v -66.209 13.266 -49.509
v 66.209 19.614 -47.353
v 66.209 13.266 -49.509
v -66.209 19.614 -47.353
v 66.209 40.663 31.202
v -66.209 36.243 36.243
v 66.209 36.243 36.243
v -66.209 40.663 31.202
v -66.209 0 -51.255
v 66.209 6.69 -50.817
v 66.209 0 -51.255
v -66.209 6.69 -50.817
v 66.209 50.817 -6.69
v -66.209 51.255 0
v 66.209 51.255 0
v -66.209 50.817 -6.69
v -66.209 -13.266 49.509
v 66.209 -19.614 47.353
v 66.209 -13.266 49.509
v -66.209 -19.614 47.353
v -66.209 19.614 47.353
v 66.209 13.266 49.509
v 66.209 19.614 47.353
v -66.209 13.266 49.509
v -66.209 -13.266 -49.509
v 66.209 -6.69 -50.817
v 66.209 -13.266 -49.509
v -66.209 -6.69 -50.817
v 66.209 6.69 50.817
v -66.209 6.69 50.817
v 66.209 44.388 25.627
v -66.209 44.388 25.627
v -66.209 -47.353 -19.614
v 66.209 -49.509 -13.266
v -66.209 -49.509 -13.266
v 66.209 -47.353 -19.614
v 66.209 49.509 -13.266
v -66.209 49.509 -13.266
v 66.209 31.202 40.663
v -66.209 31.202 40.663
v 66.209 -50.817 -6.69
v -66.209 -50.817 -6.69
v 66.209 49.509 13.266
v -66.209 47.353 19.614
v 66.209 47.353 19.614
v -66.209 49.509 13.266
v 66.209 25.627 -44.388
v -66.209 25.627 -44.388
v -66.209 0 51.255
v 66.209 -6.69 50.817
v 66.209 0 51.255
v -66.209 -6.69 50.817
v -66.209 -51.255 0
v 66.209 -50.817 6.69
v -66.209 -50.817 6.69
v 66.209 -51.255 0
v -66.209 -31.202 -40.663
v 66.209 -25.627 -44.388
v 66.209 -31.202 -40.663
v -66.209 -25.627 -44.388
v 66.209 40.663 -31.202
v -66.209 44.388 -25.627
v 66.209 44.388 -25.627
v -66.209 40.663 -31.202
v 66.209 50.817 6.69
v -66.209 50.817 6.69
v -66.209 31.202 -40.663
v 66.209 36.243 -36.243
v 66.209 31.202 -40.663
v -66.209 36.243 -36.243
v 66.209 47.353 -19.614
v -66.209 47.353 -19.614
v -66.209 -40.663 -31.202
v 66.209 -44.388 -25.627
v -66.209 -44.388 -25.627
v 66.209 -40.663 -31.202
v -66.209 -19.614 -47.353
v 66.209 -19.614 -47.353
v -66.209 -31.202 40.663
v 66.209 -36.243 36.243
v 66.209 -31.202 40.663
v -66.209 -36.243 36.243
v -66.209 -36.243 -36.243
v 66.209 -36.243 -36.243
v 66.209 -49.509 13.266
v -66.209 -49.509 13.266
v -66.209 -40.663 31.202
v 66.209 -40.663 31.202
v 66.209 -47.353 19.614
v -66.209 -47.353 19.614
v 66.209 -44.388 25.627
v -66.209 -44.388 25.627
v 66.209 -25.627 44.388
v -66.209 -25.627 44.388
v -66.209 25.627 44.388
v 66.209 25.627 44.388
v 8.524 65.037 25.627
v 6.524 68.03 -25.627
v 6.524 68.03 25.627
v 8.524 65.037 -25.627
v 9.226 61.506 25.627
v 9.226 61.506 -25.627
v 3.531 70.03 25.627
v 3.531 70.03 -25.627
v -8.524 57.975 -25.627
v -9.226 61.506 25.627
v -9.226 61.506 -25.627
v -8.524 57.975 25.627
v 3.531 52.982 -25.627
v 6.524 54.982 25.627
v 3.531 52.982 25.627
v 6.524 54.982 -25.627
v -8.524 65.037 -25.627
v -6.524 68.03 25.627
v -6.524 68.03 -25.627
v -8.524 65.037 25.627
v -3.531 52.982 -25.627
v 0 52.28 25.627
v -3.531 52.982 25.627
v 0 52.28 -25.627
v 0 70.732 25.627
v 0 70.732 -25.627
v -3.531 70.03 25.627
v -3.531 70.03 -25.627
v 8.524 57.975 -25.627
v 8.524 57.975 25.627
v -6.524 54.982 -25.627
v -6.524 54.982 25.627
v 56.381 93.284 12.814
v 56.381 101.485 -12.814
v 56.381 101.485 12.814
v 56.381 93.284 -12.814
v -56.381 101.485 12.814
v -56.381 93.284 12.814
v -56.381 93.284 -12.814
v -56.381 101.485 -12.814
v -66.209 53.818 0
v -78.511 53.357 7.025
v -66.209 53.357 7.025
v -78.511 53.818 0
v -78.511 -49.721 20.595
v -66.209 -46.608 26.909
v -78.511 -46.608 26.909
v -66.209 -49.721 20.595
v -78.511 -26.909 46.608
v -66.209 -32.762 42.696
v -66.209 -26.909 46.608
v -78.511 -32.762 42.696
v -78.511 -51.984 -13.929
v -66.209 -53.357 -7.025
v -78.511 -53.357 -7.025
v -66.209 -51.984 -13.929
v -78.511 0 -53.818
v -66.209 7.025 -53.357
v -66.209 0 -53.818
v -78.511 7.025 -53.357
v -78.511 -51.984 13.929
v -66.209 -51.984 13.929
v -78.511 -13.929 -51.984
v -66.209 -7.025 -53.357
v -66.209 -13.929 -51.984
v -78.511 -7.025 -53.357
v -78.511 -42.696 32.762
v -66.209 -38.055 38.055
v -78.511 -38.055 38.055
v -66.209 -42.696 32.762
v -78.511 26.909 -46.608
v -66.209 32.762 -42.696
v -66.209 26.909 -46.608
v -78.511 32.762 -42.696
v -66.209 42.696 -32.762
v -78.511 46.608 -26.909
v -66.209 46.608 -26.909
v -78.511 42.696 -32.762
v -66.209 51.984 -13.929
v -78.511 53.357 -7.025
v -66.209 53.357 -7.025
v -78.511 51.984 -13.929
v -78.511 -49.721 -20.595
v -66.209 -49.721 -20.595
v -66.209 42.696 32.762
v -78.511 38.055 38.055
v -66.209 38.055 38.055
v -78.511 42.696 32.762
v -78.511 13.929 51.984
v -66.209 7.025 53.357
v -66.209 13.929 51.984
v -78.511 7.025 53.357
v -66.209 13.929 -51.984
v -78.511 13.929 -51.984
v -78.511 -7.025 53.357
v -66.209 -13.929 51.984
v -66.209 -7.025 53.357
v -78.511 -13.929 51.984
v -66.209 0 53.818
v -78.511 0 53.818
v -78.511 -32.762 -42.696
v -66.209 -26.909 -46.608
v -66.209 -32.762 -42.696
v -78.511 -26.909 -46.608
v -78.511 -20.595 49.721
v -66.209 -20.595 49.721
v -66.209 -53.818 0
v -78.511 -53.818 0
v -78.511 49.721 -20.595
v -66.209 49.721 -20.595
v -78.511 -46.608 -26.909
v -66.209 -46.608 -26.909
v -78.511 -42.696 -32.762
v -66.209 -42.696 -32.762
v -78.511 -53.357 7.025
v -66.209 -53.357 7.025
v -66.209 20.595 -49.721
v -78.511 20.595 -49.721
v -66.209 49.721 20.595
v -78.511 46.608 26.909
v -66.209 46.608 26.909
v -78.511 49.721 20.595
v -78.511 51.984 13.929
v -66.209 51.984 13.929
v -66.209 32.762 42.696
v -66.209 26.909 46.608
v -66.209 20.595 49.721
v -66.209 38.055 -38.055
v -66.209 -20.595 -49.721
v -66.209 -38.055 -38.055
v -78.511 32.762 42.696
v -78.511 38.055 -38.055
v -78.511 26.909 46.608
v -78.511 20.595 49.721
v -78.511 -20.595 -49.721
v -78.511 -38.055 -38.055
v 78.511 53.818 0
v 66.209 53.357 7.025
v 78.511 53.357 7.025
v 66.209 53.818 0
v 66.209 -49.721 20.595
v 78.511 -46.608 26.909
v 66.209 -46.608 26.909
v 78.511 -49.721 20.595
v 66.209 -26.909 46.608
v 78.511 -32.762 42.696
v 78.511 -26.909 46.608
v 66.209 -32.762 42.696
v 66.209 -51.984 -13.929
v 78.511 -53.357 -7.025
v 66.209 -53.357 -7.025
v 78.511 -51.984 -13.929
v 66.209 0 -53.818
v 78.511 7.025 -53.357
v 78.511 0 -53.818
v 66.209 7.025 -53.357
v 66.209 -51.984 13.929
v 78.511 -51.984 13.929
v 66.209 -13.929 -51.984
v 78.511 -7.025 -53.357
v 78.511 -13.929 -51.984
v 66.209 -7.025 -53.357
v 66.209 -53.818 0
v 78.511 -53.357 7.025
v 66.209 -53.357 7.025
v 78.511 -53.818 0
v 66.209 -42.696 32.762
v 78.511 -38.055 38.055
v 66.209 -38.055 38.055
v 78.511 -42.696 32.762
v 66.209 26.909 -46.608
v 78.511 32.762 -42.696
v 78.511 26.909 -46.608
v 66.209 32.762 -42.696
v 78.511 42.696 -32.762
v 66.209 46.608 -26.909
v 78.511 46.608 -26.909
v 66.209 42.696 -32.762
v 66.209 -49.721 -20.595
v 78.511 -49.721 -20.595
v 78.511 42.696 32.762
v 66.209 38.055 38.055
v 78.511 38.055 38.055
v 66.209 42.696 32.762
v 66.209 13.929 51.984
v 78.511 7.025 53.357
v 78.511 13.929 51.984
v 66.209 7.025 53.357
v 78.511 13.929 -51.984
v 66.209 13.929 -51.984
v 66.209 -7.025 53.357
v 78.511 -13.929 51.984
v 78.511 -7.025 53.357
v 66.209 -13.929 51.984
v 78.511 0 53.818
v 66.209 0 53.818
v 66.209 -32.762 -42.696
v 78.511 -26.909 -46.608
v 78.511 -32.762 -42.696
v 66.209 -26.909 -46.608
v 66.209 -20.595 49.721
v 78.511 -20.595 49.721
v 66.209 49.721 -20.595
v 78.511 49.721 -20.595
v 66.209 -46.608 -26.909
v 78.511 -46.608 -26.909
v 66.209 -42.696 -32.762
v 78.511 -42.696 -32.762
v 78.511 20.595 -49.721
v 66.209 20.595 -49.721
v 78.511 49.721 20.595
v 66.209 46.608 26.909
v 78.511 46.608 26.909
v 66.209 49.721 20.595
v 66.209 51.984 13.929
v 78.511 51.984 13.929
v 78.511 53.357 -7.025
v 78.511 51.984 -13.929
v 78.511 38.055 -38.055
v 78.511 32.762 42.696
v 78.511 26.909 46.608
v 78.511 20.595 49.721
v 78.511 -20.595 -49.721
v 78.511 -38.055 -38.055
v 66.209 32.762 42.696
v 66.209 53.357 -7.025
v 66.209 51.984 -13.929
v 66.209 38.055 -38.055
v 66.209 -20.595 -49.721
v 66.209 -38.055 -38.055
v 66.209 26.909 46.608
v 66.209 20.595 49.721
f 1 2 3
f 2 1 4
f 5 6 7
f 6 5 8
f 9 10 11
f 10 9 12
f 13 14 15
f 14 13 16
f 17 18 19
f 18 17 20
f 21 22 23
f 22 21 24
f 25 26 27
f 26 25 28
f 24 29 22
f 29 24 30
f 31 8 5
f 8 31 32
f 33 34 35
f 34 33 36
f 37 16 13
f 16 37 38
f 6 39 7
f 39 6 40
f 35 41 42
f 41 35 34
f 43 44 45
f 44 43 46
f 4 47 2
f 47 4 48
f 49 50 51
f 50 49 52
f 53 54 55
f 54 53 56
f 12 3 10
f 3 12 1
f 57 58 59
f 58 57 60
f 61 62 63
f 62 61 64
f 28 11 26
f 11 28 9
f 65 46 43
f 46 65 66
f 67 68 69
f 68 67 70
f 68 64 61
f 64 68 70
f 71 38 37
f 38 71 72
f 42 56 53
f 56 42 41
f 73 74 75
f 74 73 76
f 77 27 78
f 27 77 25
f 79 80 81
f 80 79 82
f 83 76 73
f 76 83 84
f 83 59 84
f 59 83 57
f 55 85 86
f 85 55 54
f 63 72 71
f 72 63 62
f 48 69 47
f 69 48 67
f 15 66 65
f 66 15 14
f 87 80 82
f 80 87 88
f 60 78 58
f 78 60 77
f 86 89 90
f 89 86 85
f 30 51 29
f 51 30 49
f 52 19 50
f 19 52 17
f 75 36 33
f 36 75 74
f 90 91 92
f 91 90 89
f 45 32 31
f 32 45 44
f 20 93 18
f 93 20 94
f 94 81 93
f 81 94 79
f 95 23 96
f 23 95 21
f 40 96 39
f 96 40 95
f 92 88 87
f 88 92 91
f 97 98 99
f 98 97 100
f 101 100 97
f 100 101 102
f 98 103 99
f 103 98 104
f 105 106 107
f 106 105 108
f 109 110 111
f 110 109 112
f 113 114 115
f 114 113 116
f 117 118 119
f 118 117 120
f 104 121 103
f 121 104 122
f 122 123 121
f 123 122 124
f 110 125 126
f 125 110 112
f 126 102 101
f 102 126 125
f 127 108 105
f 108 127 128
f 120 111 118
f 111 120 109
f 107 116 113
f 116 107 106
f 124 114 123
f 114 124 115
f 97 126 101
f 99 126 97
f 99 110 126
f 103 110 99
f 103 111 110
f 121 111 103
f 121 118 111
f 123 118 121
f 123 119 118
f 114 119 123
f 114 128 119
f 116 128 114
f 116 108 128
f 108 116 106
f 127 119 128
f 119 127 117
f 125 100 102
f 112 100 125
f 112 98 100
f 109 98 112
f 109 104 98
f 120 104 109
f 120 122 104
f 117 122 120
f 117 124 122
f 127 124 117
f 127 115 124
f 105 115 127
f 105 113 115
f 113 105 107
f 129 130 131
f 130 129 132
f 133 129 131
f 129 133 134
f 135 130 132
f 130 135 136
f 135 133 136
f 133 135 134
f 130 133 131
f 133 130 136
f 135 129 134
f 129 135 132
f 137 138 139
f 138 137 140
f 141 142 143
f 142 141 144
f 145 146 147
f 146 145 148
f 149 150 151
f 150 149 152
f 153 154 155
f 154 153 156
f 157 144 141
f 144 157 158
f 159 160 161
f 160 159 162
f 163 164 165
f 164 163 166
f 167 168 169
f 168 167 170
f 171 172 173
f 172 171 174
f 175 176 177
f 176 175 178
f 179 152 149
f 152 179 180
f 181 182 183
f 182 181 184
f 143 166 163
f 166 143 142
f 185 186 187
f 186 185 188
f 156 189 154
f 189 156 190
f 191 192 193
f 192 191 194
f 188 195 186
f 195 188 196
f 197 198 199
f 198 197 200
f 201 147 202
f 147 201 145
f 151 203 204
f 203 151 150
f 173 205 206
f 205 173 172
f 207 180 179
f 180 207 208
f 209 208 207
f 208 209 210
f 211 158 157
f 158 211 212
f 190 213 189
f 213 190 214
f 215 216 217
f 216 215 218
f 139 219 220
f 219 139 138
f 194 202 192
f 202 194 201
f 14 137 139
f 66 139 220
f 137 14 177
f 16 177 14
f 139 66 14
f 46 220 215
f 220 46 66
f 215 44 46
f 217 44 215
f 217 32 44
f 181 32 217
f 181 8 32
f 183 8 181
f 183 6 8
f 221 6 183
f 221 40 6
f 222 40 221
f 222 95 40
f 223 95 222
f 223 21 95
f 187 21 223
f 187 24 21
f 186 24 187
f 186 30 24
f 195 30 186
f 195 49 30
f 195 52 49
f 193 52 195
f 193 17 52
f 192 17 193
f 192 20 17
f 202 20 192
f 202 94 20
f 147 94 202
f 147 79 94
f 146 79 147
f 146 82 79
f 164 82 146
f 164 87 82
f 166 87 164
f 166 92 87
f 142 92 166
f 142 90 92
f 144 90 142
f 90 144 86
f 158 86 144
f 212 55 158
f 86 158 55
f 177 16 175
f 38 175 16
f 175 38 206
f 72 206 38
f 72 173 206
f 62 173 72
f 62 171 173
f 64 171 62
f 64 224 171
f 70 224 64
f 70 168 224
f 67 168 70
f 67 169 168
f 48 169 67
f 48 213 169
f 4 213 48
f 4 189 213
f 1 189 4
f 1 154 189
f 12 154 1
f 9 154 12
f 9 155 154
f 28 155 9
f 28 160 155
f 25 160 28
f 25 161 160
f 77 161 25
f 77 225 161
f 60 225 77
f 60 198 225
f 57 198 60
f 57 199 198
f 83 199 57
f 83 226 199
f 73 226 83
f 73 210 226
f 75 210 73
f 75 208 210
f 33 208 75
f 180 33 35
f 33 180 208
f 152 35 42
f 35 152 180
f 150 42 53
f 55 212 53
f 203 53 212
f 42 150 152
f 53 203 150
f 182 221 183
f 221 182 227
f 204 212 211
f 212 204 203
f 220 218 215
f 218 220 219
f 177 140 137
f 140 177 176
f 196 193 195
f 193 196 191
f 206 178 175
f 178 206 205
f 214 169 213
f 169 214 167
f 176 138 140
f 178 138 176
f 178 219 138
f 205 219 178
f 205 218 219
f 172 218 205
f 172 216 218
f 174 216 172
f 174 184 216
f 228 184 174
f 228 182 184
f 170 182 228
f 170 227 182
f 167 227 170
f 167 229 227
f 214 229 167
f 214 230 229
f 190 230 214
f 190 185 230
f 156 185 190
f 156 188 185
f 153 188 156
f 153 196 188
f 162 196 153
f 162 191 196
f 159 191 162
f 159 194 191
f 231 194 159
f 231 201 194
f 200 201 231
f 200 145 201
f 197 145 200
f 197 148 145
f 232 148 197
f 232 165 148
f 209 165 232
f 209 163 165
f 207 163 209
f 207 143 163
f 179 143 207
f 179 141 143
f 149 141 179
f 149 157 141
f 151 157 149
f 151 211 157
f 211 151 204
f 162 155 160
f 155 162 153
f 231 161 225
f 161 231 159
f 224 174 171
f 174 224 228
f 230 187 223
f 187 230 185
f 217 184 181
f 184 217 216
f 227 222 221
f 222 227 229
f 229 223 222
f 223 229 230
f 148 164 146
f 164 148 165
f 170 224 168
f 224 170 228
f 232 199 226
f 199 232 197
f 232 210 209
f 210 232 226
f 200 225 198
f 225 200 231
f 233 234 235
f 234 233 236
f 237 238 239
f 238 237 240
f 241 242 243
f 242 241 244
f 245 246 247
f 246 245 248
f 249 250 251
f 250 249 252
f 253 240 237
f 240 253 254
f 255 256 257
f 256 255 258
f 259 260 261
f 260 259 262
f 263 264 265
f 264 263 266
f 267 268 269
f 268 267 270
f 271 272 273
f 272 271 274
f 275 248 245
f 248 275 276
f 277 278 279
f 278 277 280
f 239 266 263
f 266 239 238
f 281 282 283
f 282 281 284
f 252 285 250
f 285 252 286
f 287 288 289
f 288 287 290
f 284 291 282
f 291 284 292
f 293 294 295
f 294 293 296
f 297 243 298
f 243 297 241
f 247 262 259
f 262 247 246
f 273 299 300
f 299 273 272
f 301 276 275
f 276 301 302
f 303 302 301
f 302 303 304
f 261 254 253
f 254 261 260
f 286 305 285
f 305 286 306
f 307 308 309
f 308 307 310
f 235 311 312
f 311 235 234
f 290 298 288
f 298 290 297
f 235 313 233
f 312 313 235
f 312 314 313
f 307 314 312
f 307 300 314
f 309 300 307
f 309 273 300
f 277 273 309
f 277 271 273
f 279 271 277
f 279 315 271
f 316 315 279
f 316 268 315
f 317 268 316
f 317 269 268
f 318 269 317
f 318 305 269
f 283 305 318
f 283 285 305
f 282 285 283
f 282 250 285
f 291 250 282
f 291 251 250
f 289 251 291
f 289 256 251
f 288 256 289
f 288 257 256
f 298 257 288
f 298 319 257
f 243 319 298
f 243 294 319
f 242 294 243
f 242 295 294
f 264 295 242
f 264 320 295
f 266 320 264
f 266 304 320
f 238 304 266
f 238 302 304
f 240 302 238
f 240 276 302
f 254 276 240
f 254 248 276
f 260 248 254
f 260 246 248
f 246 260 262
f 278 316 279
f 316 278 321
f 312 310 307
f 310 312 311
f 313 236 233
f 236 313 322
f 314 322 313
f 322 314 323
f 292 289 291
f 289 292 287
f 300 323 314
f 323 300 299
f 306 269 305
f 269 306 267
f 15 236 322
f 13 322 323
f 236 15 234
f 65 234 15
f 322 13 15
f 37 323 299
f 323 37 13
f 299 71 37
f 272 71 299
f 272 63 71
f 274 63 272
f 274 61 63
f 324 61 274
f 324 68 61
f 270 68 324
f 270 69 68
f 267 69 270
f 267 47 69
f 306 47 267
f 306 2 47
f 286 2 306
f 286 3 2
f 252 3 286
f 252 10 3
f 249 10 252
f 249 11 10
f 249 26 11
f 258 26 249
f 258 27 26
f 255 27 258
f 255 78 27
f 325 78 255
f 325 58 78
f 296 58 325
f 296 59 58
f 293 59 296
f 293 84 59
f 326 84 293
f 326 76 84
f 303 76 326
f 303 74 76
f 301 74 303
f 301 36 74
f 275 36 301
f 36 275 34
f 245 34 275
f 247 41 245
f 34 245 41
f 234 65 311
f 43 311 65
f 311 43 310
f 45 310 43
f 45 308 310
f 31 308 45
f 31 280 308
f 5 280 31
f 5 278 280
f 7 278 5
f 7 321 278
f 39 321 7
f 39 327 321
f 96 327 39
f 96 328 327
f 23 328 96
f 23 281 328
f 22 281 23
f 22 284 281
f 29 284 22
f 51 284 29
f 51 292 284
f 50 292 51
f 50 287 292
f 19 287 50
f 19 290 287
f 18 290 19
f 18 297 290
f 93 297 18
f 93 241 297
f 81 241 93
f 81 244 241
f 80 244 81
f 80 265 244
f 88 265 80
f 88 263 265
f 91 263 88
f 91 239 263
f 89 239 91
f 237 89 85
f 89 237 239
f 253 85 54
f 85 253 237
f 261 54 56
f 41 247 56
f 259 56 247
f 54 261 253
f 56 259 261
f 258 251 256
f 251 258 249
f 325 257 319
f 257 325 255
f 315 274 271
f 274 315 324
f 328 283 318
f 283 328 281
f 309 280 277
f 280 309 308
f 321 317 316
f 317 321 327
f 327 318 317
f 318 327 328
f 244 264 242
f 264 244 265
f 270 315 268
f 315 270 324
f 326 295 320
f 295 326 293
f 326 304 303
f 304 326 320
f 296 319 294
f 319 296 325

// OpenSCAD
// Auto-generated by scripts/author_from_manifest.py (Phase D.3).
// Source: data/phase_d_manifest.json (sku_intent='nibco-lc-2000-butterfly-2in').
// Do not hand-edit — regenerate from the manifest.
//
// @part nibco_lc_2000_butterfly_2in
// @kind valve
// @category valve.butterfly
// @display-name "Nibco LC-2000 Grooved Butterfly Valve 2\" w/ Tamper Switch"
// @mfg nibco
// @mfg-pn LC-2000
// @listing UL FM
// @price-usd 230.00
// @install-minutes 30
// @crew foreman
// @param size_in number default=2 label="Size" unit="in"
// @port inlet position=[-0.05,0,0] direction=[-1,0,0] style=grooved size_in=2 role=run_a
// @port outlet position=[0.05,0,0] direction=[1,0,0] style=grooved size_in=2 role=run_b

size_in = 2.0;

function od_mm(nps) =
    nps ==   1  ? 33.4 :
    nps == 1.25 ? 42.2 :
    nps == 1.5  ? 48.3 :
    nps ==   2  ? 60.3 :
    nps == 2.5  ? 73.0 :
    nps ==   3  ? 88.9 :
    nps ==   4  ? 114.3 :
    nps ==   6  ? 168.3 :
    nps ==   8  ? 219.1 : 73.0;

od = od_mm(size_in);
body_len = od * 2.4;
body_d   = od * 1.7;

union() {
    // Valve body
    rotate([0, 90, 0])
        cylinder(h = body_len, d = body_d, center = true, $fn = 48);
    // Stem / handle indicator
    translate([0, body_d * 0.6, 0])
        cylinder(h = body_d * 0.5, d = body_d * 0.18, center = true, $fn = 16);
    translate([0, body_d * 0.95, 0])
        cube([body_d * 1.1, body_d * 0.08, body_d * 0.25], center = true);
    // End flanges
    translate([-body_len/2, 0, 0])
        rotate([0, 90, 0])
        cylinder(h = body_d * 0.12, d = body_d * 1.05, center = true, $fn = 48);
    translate([ body_len/2, 0, 0])
        rotate([0, 90, 0])
        cylinder(h = body_d * 0.12, d = body_d * 1.05, center = true, $fn = 48);
}
